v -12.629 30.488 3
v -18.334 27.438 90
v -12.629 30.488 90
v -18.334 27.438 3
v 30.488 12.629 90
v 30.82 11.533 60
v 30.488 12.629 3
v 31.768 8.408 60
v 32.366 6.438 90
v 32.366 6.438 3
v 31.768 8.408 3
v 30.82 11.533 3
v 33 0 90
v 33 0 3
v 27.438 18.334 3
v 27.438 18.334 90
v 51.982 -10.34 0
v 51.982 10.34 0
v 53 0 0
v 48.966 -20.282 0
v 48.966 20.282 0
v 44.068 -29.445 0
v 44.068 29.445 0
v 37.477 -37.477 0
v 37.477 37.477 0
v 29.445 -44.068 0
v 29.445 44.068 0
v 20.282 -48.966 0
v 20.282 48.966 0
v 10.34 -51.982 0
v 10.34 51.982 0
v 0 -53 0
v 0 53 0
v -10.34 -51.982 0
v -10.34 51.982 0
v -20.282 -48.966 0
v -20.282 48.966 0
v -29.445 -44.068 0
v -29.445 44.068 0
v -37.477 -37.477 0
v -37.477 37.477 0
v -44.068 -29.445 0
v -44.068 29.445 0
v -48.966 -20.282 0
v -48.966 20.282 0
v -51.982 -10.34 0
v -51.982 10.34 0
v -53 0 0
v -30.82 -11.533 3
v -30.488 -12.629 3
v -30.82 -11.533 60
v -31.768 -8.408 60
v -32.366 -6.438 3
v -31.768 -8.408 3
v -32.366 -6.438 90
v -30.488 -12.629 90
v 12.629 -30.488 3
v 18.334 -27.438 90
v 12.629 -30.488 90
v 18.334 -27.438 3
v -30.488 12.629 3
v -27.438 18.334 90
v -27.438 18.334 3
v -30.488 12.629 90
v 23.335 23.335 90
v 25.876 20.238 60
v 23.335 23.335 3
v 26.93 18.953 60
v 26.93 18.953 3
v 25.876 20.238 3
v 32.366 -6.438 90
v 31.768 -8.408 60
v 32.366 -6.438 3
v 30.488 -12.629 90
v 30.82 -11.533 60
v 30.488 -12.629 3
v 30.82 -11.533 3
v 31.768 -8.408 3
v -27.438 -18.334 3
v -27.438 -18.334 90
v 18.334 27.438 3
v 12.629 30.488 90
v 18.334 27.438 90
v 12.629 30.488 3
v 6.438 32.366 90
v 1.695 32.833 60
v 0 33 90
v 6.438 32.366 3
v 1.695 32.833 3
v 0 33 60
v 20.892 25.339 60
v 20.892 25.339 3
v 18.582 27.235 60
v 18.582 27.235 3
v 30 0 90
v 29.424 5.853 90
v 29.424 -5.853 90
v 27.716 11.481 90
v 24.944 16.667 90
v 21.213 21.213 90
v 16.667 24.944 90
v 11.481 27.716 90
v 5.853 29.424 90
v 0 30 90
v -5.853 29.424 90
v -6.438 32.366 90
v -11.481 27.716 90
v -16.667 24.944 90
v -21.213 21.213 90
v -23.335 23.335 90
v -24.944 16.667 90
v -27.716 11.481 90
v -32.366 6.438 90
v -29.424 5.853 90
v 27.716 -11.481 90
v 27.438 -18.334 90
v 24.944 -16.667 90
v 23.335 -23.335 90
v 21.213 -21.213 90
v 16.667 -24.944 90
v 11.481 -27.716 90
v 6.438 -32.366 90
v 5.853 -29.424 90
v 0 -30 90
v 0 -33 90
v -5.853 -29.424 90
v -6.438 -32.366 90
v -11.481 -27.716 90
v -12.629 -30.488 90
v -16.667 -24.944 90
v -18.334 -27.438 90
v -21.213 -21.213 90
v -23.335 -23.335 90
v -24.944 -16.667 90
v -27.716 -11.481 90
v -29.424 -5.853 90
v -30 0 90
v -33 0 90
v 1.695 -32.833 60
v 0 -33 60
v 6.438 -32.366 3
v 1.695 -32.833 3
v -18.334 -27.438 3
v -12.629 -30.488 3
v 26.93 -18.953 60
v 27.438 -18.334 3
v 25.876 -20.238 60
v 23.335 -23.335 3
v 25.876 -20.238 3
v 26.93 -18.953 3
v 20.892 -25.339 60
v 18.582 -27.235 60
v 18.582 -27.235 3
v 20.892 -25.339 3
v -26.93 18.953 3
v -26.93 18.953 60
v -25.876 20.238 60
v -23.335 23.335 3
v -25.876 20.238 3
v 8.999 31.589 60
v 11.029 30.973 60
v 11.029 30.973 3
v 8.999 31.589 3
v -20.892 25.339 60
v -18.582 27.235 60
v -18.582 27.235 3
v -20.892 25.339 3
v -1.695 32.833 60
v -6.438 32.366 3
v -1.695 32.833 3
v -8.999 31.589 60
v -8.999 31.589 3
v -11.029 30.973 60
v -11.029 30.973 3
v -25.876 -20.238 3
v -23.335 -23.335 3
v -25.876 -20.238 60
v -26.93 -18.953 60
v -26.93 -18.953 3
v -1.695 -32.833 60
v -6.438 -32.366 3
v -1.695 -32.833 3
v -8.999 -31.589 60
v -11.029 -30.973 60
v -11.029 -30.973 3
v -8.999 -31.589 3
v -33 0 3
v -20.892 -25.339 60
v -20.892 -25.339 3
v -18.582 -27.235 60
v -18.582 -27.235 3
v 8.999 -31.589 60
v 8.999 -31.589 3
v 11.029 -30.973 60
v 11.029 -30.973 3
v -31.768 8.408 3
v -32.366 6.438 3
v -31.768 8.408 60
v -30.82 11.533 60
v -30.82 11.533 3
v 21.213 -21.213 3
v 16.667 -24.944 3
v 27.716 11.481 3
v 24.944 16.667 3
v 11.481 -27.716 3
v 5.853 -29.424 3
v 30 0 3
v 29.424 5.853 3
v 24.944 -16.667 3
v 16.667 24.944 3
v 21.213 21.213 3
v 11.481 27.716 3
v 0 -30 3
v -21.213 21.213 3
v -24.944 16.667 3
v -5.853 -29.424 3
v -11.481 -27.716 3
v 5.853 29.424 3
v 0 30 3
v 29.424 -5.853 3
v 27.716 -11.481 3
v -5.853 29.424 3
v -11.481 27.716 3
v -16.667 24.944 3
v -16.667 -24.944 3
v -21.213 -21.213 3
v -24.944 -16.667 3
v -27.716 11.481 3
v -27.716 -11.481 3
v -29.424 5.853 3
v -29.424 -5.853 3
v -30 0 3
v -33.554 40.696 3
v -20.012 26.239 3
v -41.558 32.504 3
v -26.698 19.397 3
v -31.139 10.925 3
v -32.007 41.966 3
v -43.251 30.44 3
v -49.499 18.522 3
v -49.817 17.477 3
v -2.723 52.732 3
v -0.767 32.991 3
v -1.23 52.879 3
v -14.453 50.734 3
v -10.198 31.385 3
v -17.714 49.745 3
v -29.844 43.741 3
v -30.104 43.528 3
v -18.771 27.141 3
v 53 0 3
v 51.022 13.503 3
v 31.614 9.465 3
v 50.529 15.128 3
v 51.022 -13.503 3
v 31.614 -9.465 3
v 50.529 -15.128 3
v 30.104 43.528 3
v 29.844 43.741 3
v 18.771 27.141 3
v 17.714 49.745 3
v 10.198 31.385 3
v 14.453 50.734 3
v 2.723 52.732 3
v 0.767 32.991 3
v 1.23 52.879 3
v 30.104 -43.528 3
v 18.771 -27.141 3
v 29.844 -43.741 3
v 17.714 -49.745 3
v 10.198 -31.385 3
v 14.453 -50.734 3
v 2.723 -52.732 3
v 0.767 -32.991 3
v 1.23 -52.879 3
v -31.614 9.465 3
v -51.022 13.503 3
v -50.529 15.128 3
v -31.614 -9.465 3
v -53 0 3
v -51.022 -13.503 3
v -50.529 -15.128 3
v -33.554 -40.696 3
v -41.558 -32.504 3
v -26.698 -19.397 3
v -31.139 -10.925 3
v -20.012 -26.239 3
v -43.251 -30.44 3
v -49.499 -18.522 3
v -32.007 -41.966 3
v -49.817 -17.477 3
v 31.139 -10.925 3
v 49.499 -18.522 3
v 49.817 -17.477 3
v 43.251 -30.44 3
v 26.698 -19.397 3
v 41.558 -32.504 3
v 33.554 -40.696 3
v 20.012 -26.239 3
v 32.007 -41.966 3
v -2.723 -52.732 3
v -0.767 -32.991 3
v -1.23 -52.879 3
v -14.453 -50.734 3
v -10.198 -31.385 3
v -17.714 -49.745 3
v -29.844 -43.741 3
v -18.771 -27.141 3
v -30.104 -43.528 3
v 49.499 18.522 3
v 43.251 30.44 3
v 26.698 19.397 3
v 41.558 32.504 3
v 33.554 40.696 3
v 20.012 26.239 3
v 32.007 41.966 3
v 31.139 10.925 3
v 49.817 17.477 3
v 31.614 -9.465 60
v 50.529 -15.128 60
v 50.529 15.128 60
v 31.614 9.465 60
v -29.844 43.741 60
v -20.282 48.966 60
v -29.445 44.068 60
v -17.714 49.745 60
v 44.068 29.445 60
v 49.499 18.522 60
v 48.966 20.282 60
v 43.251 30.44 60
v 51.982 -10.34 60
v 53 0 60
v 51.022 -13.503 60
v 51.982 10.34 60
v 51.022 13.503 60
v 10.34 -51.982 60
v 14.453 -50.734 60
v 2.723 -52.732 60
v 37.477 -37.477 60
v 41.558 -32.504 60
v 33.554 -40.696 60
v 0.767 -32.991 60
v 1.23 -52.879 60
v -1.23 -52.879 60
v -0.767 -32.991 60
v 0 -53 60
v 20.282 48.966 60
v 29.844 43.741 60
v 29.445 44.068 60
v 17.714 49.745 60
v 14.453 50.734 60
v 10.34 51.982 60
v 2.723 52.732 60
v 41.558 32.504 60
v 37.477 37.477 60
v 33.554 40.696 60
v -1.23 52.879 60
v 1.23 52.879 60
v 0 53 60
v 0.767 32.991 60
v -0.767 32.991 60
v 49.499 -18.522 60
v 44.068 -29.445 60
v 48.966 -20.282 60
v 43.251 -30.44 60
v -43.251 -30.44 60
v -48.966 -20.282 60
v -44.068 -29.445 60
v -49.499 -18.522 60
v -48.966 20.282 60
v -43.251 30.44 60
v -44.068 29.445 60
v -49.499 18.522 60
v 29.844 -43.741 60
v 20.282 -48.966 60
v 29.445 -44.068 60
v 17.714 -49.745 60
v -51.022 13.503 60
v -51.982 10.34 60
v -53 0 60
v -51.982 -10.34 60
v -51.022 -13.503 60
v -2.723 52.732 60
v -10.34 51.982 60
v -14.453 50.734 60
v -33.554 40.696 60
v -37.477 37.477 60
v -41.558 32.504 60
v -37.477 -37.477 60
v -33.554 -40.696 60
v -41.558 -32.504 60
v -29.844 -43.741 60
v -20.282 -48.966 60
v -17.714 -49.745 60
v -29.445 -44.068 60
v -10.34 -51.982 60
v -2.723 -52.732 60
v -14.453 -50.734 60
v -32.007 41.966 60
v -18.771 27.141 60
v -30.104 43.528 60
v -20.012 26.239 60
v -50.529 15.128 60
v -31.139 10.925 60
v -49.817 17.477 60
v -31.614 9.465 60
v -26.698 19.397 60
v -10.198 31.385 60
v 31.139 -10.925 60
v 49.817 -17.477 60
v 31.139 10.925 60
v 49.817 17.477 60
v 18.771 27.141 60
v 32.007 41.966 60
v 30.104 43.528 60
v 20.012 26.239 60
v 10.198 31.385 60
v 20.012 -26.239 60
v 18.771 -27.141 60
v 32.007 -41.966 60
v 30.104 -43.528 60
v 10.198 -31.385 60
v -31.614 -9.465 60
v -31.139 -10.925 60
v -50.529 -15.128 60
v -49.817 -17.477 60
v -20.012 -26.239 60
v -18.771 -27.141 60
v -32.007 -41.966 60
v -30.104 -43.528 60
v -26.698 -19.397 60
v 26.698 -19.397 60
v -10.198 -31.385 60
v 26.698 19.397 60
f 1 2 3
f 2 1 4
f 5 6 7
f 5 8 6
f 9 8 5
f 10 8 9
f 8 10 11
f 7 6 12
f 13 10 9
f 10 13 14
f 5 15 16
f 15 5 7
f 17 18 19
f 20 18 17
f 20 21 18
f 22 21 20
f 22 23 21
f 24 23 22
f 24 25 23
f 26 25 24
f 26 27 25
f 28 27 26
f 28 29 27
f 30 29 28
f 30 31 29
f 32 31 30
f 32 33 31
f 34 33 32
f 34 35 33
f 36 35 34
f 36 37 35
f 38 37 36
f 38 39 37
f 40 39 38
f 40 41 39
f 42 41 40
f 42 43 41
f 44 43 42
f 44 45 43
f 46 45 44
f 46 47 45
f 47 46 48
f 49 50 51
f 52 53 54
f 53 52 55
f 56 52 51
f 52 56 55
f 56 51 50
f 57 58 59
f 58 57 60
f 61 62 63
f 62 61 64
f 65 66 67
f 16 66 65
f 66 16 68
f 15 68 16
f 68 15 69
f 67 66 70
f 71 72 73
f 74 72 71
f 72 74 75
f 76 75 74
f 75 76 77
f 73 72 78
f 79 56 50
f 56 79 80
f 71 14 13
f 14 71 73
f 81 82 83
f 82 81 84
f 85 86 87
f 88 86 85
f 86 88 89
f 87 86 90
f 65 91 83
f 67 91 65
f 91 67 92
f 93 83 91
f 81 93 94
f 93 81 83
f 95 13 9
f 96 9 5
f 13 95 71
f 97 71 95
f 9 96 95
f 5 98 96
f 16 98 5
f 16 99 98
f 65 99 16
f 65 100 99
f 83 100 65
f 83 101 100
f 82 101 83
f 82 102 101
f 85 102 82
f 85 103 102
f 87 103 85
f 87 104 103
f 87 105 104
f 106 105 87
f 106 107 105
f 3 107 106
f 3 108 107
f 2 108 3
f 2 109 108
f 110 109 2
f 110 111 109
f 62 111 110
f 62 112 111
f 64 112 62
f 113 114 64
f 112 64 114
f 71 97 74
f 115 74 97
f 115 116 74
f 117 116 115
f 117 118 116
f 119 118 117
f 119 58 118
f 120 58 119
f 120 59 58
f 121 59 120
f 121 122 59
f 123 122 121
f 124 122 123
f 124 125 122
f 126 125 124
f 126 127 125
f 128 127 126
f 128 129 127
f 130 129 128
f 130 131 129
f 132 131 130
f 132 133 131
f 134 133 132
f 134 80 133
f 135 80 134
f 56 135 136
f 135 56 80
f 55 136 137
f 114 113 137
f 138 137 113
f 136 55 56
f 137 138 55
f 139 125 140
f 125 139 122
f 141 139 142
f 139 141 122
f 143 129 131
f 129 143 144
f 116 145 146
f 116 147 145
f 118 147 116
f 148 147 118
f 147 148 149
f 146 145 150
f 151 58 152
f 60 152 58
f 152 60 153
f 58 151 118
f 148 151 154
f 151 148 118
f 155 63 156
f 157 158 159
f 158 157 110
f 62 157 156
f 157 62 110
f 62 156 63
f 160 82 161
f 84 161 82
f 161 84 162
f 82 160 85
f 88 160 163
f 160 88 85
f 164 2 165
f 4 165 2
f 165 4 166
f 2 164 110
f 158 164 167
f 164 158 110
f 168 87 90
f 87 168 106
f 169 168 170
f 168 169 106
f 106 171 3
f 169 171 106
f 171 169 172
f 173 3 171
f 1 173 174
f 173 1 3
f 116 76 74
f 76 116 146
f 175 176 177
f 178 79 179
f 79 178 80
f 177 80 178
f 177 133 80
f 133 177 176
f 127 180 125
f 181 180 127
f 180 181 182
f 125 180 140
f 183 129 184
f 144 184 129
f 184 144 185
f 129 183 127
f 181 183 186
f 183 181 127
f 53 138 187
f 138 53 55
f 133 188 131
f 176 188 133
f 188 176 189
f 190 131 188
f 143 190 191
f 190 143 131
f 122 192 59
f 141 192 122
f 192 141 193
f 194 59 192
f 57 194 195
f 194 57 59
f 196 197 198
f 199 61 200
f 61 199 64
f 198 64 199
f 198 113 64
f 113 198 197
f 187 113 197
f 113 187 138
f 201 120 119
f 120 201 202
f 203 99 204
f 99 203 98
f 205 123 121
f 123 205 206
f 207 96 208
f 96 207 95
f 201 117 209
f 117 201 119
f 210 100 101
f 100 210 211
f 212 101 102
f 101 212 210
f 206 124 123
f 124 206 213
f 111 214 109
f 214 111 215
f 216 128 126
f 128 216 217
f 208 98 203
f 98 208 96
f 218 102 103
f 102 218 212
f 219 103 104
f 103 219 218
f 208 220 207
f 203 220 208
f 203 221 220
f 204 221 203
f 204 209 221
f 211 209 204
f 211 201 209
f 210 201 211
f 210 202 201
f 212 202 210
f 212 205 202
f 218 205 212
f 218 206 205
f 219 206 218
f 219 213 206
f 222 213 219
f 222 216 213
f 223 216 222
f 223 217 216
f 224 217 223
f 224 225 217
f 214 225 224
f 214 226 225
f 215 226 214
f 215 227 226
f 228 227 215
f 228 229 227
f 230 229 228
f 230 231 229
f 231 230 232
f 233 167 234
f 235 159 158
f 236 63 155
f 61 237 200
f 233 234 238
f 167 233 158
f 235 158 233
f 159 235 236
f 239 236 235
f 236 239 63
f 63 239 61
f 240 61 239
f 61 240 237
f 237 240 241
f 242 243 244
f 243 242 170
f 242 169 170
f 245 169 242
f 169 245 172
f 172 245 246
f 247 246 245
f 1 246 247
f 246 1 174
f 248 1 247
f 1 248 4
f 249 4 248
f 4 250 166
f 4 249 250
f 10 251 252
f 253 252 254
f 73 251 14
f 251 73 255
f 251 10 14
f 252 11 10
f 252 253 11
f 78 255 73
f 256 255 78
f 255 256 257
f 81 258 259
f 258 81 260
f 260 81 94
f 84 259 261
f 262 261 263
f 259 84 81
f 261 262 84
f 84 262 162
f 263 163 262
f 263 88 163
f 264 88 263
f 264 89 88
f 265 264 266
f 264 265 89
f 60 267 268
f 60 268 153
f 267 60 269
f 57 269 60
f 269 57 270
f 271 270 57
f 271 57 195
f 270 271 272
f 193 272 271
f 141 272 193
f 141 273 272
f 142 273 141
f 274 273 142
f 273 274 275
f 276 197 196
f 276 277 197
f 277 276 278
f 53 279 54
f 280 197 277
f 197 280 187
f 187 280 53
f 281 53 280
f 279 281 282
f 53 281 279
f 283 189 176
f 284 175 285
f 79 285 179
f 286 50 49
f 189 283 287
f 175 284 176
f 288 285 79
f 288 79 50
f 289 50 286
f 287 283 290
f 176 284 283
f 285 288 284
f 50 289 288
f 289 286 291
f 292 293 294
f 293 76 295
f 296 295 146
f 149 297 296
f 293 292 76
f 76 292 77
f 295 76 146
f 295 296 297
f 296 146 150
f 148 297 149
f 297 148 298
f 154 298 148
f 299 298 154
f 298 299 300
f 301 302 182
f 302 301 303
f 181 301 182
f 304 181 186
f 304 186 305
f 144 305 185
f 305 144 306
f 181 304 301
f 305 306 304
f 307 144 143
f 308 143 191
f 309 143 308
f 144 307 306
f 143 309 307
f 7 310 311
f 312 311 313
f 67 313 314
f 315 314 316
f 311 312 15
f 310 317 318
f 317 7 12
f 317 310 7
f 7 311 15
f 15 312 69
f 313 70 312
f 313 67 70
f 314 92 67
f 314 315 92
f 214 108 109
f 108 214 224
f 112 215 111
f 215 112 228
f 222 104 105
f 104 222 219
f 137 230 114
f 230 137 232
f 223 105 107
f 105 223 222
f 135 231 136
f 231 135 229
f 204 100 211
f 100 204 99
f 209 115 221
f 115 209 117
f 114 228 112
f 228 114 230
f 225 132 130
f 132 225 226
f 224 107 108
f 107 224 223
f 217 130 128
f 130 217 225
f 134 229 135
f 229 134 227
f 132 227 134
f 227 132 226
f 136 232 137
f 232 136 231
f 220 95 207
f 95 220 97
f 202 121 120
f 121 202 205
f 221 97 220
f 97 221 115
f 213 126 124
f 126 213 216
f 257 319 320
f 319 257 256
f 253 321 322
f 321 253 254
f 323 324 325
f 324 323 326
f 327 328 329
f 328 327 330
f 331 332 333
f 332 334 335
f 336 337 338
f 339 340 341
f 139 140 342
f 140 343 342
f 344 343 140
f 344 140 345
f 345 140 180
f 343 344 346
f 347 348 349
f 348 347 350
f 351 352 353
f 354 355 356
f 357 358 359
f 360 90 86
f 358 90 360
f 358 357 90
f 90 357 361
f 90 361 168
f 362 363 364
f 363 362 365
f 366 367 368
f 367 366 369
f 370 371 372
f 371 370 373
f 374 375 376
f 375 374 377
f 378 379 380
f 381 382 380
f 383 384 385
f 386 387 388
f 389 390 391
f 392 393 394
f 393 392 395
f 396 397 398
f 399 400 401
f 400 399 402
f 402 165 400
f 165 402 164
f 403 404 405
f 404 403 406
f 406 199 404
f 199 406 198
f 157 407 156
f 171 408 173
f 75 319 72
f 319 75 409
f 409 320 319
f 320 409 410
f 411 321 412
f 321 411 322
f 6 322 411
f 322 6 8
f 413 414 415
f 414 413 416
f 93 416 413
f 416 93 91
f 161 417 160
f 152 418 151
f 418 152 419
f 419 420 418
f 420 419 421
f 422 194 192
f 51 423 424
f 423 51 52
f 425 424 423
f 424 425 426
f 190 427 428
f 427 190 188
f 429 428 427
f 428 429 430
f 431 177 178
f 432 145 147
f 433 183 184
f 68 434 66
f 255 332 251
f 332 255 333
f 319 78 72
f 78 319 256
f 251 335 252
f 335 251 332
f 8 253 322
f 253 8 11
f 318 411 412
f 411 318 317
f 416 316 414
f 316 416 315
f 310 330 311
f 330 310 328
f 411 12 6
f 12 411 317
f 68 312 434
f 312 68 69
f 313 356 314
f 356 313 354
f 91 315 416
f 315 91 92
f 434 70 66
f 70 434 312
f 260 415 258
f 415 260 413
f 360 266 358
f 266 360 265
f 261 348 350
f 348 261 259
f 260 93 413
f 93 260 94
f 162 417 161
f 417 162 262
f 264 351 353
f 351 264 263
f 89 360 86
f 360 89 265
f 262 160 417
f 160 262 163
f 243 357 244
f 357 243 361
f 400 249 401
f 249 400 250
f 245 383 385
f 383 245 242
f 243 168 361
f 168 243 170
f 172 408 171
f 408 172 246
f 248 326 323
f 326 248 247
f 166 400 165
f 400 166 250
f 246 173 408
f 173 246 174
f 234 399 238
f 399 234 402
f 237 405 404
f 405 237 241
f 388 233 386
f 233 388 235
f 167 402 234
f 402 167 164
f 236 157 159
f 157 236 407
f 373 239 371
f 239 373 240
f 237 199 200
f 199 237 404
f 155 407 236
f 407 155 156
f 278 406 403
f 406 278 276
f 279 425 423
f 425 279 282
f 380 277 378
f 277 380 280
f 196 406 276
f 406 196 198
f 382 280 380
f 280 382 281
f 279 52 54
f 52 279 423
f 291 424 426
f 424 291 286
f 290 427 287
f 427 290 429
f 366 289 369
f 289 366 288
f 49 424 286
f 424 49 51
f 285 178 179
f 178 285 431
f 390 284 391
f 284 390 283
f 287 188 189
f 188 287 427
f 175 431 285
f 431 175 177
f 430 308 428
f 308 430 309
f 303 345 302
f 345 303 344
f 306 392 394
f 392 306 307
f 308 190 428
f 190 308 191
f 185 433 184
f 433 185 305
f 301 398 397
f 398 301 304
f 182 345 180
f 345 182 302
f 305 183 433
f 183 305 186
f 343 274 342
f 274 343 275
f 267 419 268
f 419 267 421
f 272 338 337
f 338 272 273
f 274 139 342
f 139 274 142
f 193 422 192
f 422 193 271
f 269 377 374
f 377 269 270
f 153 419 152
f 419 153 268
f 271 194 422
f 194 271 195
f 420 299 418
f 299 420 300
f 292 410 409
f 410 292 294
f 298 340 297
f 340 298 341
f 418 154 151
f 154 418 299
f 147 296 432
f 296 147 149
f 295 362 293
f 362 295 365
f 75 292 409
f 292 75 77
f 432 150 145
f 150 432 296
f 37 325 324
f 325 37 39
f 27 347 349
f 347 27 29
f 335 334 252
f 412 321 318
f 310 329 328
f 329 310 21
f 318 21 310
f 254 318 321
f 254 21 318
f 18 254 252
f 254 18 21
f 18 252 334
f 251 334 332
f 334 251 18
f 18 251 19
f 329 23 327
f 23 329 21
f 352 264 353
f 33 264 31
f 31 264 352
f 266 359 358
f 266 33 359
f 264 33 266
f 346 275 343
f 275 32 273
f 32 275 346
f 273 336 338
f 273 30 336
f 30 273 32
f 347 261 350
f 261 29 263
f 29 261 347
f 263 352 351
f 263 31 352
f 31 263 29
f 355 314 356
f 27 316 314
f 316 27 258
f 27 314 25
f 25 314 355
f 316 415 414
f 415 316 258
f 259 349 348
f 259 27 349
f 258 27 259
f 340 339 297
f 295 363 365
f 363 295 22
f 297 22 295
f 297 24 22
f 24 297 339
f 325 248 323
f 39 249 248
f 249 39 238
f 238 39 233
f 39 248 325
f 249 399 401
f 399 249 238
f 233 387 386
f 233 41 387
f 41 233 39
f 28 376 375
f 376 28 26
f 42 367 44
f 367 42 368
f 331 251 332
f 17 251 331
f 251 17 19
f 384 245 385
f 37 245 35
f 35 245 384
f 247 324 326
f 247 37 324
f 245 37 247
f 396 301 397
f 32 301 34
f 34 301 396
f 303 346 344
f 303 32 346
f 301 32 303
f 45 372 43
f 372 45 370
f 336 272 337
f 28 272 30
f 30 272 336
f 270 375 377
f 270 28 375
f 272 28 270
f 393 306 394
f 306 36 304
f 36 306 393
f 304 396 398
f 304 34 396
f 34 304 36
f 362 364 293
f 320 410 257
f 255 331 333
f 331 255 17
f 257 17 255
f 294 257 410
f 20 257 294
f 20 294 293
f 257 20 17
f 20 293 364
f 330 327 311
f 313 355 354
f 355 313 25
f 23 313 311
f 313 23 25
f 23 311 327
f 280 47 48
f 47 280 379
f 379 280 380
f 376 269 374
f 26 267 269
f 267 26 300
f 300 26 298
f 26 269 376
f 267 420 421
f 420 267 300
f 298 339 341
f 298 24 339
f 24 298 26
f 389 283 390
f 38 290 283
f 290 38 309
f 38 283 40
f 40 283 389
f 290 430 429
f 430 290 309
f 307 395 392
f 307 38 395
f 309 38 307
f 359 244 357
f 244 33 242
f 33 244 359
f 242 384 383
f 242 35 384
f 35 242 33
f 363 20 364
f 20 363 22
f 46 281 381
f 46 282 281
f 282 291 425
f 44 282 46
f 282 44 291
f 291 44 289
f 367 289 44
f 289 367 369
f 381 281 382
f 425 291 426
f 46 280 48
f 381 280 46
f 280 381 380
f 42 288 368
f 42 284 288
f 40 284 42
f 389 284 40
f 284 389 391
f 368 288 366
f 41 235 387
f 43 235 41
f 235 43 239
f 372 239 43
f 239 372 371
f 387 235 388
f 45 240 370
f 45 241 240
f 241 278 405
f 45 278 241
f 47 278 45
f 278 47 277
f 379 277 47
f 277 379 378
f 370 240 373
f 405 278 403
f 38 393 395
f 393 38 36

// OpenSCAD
// Stiftköcher mit geschlossenem Innenbecher + niedrigem Außenring mit Fächern
// Version 2.2

// --- Parameter ---
inner_diameter       = 60;   // Durchmesser des inneren Hauptfachs (mm)
inner_height         = 90;   // Höhe des inneren Hauptfachs (mm)

outer_ring_width     = 20;   // Breite des äußeren Ringes (mm)
outer_height         = 60;   // Höhe der äußeren Fächer + äußerer Rand (mm)

wall_thickness       = 3;    // Wandstärke (innen und außen)
bottom_thickness     = 3;    // Bodenstärke (mm)

outer_compartments   = 10;   // Anzahl der schmalen Außenfächer
outer_wall_thickness = 2;    // Dicke der Zwischenwände außen (mm)

$fn = 32; // Glätte für Rundungen

// --- Hilfsfunktion: Grad/Rad ---
function rad2deg(a) = a * 180 / PI;

// --- Modul: Ringschneide-Sektor (für Hohlräume der Außenfächer) ---
module ring_sector(r_in, r_out, angle_deg, h) {
    rotate([0,0,-angle_deg/2])  // Zentriere den Sektor
    rotate_extrude(angle = angle_deg, convexity = 10)
        translate([r_in, 0, 0])
            square([r_out - r_in, h], center = false);
}

// --- Hauptmodul ---
module pen_holder() {
    inner_r = inner_diameter/2;
    outer_r_in  = inner_r + wall_thickness;
    outer_r_out = outer_r_in + outer_ring_width;

    // 1) Innenbecher mit geschlossenem Rand
    difference() {
        cylinder(h = inner_height, r = inner_r + wall_thickness);
        translate([0,0,bottom_thickness])
            cylinder(h = inner_height - bottom_thickness, r = inner_r);
    }

    // 2) Außenring mit niedriger Höhe + Fächern
    difference() {
        // Außenringkörper
        cylinder(h = outer_height, r = outer_r_out);
        translate([0,0,bottom_thickness])
            cylinder(h = outer_height - bottom_thickness, r = outer_r_in);

        // Fächer als ausgesparte Sektoren
        ring_mid_r = (outer_r_in + outer_r_out) / 2;
        wall_angle_deg = rad2deg(outer_wall_thickness / ring_mid_r);
        base_angle_deg = 360 / outer_compartments;
        slot_angle_deg = max(1, base_angle_deg - wall_angle_deg);

        for (i = [0:outer_compartments-1]) {
            angle_center = i * base_angle_deg;
            translate([0,0,bottom_thickness])
                rotate([0,0,angle_center])
                    ring_sector(outer_r_in, outer_r_out, slot_angle_deg, outer_height - bottom_thickness);
        }
    }
}

// --- Aufruf ---
pen_holder();
